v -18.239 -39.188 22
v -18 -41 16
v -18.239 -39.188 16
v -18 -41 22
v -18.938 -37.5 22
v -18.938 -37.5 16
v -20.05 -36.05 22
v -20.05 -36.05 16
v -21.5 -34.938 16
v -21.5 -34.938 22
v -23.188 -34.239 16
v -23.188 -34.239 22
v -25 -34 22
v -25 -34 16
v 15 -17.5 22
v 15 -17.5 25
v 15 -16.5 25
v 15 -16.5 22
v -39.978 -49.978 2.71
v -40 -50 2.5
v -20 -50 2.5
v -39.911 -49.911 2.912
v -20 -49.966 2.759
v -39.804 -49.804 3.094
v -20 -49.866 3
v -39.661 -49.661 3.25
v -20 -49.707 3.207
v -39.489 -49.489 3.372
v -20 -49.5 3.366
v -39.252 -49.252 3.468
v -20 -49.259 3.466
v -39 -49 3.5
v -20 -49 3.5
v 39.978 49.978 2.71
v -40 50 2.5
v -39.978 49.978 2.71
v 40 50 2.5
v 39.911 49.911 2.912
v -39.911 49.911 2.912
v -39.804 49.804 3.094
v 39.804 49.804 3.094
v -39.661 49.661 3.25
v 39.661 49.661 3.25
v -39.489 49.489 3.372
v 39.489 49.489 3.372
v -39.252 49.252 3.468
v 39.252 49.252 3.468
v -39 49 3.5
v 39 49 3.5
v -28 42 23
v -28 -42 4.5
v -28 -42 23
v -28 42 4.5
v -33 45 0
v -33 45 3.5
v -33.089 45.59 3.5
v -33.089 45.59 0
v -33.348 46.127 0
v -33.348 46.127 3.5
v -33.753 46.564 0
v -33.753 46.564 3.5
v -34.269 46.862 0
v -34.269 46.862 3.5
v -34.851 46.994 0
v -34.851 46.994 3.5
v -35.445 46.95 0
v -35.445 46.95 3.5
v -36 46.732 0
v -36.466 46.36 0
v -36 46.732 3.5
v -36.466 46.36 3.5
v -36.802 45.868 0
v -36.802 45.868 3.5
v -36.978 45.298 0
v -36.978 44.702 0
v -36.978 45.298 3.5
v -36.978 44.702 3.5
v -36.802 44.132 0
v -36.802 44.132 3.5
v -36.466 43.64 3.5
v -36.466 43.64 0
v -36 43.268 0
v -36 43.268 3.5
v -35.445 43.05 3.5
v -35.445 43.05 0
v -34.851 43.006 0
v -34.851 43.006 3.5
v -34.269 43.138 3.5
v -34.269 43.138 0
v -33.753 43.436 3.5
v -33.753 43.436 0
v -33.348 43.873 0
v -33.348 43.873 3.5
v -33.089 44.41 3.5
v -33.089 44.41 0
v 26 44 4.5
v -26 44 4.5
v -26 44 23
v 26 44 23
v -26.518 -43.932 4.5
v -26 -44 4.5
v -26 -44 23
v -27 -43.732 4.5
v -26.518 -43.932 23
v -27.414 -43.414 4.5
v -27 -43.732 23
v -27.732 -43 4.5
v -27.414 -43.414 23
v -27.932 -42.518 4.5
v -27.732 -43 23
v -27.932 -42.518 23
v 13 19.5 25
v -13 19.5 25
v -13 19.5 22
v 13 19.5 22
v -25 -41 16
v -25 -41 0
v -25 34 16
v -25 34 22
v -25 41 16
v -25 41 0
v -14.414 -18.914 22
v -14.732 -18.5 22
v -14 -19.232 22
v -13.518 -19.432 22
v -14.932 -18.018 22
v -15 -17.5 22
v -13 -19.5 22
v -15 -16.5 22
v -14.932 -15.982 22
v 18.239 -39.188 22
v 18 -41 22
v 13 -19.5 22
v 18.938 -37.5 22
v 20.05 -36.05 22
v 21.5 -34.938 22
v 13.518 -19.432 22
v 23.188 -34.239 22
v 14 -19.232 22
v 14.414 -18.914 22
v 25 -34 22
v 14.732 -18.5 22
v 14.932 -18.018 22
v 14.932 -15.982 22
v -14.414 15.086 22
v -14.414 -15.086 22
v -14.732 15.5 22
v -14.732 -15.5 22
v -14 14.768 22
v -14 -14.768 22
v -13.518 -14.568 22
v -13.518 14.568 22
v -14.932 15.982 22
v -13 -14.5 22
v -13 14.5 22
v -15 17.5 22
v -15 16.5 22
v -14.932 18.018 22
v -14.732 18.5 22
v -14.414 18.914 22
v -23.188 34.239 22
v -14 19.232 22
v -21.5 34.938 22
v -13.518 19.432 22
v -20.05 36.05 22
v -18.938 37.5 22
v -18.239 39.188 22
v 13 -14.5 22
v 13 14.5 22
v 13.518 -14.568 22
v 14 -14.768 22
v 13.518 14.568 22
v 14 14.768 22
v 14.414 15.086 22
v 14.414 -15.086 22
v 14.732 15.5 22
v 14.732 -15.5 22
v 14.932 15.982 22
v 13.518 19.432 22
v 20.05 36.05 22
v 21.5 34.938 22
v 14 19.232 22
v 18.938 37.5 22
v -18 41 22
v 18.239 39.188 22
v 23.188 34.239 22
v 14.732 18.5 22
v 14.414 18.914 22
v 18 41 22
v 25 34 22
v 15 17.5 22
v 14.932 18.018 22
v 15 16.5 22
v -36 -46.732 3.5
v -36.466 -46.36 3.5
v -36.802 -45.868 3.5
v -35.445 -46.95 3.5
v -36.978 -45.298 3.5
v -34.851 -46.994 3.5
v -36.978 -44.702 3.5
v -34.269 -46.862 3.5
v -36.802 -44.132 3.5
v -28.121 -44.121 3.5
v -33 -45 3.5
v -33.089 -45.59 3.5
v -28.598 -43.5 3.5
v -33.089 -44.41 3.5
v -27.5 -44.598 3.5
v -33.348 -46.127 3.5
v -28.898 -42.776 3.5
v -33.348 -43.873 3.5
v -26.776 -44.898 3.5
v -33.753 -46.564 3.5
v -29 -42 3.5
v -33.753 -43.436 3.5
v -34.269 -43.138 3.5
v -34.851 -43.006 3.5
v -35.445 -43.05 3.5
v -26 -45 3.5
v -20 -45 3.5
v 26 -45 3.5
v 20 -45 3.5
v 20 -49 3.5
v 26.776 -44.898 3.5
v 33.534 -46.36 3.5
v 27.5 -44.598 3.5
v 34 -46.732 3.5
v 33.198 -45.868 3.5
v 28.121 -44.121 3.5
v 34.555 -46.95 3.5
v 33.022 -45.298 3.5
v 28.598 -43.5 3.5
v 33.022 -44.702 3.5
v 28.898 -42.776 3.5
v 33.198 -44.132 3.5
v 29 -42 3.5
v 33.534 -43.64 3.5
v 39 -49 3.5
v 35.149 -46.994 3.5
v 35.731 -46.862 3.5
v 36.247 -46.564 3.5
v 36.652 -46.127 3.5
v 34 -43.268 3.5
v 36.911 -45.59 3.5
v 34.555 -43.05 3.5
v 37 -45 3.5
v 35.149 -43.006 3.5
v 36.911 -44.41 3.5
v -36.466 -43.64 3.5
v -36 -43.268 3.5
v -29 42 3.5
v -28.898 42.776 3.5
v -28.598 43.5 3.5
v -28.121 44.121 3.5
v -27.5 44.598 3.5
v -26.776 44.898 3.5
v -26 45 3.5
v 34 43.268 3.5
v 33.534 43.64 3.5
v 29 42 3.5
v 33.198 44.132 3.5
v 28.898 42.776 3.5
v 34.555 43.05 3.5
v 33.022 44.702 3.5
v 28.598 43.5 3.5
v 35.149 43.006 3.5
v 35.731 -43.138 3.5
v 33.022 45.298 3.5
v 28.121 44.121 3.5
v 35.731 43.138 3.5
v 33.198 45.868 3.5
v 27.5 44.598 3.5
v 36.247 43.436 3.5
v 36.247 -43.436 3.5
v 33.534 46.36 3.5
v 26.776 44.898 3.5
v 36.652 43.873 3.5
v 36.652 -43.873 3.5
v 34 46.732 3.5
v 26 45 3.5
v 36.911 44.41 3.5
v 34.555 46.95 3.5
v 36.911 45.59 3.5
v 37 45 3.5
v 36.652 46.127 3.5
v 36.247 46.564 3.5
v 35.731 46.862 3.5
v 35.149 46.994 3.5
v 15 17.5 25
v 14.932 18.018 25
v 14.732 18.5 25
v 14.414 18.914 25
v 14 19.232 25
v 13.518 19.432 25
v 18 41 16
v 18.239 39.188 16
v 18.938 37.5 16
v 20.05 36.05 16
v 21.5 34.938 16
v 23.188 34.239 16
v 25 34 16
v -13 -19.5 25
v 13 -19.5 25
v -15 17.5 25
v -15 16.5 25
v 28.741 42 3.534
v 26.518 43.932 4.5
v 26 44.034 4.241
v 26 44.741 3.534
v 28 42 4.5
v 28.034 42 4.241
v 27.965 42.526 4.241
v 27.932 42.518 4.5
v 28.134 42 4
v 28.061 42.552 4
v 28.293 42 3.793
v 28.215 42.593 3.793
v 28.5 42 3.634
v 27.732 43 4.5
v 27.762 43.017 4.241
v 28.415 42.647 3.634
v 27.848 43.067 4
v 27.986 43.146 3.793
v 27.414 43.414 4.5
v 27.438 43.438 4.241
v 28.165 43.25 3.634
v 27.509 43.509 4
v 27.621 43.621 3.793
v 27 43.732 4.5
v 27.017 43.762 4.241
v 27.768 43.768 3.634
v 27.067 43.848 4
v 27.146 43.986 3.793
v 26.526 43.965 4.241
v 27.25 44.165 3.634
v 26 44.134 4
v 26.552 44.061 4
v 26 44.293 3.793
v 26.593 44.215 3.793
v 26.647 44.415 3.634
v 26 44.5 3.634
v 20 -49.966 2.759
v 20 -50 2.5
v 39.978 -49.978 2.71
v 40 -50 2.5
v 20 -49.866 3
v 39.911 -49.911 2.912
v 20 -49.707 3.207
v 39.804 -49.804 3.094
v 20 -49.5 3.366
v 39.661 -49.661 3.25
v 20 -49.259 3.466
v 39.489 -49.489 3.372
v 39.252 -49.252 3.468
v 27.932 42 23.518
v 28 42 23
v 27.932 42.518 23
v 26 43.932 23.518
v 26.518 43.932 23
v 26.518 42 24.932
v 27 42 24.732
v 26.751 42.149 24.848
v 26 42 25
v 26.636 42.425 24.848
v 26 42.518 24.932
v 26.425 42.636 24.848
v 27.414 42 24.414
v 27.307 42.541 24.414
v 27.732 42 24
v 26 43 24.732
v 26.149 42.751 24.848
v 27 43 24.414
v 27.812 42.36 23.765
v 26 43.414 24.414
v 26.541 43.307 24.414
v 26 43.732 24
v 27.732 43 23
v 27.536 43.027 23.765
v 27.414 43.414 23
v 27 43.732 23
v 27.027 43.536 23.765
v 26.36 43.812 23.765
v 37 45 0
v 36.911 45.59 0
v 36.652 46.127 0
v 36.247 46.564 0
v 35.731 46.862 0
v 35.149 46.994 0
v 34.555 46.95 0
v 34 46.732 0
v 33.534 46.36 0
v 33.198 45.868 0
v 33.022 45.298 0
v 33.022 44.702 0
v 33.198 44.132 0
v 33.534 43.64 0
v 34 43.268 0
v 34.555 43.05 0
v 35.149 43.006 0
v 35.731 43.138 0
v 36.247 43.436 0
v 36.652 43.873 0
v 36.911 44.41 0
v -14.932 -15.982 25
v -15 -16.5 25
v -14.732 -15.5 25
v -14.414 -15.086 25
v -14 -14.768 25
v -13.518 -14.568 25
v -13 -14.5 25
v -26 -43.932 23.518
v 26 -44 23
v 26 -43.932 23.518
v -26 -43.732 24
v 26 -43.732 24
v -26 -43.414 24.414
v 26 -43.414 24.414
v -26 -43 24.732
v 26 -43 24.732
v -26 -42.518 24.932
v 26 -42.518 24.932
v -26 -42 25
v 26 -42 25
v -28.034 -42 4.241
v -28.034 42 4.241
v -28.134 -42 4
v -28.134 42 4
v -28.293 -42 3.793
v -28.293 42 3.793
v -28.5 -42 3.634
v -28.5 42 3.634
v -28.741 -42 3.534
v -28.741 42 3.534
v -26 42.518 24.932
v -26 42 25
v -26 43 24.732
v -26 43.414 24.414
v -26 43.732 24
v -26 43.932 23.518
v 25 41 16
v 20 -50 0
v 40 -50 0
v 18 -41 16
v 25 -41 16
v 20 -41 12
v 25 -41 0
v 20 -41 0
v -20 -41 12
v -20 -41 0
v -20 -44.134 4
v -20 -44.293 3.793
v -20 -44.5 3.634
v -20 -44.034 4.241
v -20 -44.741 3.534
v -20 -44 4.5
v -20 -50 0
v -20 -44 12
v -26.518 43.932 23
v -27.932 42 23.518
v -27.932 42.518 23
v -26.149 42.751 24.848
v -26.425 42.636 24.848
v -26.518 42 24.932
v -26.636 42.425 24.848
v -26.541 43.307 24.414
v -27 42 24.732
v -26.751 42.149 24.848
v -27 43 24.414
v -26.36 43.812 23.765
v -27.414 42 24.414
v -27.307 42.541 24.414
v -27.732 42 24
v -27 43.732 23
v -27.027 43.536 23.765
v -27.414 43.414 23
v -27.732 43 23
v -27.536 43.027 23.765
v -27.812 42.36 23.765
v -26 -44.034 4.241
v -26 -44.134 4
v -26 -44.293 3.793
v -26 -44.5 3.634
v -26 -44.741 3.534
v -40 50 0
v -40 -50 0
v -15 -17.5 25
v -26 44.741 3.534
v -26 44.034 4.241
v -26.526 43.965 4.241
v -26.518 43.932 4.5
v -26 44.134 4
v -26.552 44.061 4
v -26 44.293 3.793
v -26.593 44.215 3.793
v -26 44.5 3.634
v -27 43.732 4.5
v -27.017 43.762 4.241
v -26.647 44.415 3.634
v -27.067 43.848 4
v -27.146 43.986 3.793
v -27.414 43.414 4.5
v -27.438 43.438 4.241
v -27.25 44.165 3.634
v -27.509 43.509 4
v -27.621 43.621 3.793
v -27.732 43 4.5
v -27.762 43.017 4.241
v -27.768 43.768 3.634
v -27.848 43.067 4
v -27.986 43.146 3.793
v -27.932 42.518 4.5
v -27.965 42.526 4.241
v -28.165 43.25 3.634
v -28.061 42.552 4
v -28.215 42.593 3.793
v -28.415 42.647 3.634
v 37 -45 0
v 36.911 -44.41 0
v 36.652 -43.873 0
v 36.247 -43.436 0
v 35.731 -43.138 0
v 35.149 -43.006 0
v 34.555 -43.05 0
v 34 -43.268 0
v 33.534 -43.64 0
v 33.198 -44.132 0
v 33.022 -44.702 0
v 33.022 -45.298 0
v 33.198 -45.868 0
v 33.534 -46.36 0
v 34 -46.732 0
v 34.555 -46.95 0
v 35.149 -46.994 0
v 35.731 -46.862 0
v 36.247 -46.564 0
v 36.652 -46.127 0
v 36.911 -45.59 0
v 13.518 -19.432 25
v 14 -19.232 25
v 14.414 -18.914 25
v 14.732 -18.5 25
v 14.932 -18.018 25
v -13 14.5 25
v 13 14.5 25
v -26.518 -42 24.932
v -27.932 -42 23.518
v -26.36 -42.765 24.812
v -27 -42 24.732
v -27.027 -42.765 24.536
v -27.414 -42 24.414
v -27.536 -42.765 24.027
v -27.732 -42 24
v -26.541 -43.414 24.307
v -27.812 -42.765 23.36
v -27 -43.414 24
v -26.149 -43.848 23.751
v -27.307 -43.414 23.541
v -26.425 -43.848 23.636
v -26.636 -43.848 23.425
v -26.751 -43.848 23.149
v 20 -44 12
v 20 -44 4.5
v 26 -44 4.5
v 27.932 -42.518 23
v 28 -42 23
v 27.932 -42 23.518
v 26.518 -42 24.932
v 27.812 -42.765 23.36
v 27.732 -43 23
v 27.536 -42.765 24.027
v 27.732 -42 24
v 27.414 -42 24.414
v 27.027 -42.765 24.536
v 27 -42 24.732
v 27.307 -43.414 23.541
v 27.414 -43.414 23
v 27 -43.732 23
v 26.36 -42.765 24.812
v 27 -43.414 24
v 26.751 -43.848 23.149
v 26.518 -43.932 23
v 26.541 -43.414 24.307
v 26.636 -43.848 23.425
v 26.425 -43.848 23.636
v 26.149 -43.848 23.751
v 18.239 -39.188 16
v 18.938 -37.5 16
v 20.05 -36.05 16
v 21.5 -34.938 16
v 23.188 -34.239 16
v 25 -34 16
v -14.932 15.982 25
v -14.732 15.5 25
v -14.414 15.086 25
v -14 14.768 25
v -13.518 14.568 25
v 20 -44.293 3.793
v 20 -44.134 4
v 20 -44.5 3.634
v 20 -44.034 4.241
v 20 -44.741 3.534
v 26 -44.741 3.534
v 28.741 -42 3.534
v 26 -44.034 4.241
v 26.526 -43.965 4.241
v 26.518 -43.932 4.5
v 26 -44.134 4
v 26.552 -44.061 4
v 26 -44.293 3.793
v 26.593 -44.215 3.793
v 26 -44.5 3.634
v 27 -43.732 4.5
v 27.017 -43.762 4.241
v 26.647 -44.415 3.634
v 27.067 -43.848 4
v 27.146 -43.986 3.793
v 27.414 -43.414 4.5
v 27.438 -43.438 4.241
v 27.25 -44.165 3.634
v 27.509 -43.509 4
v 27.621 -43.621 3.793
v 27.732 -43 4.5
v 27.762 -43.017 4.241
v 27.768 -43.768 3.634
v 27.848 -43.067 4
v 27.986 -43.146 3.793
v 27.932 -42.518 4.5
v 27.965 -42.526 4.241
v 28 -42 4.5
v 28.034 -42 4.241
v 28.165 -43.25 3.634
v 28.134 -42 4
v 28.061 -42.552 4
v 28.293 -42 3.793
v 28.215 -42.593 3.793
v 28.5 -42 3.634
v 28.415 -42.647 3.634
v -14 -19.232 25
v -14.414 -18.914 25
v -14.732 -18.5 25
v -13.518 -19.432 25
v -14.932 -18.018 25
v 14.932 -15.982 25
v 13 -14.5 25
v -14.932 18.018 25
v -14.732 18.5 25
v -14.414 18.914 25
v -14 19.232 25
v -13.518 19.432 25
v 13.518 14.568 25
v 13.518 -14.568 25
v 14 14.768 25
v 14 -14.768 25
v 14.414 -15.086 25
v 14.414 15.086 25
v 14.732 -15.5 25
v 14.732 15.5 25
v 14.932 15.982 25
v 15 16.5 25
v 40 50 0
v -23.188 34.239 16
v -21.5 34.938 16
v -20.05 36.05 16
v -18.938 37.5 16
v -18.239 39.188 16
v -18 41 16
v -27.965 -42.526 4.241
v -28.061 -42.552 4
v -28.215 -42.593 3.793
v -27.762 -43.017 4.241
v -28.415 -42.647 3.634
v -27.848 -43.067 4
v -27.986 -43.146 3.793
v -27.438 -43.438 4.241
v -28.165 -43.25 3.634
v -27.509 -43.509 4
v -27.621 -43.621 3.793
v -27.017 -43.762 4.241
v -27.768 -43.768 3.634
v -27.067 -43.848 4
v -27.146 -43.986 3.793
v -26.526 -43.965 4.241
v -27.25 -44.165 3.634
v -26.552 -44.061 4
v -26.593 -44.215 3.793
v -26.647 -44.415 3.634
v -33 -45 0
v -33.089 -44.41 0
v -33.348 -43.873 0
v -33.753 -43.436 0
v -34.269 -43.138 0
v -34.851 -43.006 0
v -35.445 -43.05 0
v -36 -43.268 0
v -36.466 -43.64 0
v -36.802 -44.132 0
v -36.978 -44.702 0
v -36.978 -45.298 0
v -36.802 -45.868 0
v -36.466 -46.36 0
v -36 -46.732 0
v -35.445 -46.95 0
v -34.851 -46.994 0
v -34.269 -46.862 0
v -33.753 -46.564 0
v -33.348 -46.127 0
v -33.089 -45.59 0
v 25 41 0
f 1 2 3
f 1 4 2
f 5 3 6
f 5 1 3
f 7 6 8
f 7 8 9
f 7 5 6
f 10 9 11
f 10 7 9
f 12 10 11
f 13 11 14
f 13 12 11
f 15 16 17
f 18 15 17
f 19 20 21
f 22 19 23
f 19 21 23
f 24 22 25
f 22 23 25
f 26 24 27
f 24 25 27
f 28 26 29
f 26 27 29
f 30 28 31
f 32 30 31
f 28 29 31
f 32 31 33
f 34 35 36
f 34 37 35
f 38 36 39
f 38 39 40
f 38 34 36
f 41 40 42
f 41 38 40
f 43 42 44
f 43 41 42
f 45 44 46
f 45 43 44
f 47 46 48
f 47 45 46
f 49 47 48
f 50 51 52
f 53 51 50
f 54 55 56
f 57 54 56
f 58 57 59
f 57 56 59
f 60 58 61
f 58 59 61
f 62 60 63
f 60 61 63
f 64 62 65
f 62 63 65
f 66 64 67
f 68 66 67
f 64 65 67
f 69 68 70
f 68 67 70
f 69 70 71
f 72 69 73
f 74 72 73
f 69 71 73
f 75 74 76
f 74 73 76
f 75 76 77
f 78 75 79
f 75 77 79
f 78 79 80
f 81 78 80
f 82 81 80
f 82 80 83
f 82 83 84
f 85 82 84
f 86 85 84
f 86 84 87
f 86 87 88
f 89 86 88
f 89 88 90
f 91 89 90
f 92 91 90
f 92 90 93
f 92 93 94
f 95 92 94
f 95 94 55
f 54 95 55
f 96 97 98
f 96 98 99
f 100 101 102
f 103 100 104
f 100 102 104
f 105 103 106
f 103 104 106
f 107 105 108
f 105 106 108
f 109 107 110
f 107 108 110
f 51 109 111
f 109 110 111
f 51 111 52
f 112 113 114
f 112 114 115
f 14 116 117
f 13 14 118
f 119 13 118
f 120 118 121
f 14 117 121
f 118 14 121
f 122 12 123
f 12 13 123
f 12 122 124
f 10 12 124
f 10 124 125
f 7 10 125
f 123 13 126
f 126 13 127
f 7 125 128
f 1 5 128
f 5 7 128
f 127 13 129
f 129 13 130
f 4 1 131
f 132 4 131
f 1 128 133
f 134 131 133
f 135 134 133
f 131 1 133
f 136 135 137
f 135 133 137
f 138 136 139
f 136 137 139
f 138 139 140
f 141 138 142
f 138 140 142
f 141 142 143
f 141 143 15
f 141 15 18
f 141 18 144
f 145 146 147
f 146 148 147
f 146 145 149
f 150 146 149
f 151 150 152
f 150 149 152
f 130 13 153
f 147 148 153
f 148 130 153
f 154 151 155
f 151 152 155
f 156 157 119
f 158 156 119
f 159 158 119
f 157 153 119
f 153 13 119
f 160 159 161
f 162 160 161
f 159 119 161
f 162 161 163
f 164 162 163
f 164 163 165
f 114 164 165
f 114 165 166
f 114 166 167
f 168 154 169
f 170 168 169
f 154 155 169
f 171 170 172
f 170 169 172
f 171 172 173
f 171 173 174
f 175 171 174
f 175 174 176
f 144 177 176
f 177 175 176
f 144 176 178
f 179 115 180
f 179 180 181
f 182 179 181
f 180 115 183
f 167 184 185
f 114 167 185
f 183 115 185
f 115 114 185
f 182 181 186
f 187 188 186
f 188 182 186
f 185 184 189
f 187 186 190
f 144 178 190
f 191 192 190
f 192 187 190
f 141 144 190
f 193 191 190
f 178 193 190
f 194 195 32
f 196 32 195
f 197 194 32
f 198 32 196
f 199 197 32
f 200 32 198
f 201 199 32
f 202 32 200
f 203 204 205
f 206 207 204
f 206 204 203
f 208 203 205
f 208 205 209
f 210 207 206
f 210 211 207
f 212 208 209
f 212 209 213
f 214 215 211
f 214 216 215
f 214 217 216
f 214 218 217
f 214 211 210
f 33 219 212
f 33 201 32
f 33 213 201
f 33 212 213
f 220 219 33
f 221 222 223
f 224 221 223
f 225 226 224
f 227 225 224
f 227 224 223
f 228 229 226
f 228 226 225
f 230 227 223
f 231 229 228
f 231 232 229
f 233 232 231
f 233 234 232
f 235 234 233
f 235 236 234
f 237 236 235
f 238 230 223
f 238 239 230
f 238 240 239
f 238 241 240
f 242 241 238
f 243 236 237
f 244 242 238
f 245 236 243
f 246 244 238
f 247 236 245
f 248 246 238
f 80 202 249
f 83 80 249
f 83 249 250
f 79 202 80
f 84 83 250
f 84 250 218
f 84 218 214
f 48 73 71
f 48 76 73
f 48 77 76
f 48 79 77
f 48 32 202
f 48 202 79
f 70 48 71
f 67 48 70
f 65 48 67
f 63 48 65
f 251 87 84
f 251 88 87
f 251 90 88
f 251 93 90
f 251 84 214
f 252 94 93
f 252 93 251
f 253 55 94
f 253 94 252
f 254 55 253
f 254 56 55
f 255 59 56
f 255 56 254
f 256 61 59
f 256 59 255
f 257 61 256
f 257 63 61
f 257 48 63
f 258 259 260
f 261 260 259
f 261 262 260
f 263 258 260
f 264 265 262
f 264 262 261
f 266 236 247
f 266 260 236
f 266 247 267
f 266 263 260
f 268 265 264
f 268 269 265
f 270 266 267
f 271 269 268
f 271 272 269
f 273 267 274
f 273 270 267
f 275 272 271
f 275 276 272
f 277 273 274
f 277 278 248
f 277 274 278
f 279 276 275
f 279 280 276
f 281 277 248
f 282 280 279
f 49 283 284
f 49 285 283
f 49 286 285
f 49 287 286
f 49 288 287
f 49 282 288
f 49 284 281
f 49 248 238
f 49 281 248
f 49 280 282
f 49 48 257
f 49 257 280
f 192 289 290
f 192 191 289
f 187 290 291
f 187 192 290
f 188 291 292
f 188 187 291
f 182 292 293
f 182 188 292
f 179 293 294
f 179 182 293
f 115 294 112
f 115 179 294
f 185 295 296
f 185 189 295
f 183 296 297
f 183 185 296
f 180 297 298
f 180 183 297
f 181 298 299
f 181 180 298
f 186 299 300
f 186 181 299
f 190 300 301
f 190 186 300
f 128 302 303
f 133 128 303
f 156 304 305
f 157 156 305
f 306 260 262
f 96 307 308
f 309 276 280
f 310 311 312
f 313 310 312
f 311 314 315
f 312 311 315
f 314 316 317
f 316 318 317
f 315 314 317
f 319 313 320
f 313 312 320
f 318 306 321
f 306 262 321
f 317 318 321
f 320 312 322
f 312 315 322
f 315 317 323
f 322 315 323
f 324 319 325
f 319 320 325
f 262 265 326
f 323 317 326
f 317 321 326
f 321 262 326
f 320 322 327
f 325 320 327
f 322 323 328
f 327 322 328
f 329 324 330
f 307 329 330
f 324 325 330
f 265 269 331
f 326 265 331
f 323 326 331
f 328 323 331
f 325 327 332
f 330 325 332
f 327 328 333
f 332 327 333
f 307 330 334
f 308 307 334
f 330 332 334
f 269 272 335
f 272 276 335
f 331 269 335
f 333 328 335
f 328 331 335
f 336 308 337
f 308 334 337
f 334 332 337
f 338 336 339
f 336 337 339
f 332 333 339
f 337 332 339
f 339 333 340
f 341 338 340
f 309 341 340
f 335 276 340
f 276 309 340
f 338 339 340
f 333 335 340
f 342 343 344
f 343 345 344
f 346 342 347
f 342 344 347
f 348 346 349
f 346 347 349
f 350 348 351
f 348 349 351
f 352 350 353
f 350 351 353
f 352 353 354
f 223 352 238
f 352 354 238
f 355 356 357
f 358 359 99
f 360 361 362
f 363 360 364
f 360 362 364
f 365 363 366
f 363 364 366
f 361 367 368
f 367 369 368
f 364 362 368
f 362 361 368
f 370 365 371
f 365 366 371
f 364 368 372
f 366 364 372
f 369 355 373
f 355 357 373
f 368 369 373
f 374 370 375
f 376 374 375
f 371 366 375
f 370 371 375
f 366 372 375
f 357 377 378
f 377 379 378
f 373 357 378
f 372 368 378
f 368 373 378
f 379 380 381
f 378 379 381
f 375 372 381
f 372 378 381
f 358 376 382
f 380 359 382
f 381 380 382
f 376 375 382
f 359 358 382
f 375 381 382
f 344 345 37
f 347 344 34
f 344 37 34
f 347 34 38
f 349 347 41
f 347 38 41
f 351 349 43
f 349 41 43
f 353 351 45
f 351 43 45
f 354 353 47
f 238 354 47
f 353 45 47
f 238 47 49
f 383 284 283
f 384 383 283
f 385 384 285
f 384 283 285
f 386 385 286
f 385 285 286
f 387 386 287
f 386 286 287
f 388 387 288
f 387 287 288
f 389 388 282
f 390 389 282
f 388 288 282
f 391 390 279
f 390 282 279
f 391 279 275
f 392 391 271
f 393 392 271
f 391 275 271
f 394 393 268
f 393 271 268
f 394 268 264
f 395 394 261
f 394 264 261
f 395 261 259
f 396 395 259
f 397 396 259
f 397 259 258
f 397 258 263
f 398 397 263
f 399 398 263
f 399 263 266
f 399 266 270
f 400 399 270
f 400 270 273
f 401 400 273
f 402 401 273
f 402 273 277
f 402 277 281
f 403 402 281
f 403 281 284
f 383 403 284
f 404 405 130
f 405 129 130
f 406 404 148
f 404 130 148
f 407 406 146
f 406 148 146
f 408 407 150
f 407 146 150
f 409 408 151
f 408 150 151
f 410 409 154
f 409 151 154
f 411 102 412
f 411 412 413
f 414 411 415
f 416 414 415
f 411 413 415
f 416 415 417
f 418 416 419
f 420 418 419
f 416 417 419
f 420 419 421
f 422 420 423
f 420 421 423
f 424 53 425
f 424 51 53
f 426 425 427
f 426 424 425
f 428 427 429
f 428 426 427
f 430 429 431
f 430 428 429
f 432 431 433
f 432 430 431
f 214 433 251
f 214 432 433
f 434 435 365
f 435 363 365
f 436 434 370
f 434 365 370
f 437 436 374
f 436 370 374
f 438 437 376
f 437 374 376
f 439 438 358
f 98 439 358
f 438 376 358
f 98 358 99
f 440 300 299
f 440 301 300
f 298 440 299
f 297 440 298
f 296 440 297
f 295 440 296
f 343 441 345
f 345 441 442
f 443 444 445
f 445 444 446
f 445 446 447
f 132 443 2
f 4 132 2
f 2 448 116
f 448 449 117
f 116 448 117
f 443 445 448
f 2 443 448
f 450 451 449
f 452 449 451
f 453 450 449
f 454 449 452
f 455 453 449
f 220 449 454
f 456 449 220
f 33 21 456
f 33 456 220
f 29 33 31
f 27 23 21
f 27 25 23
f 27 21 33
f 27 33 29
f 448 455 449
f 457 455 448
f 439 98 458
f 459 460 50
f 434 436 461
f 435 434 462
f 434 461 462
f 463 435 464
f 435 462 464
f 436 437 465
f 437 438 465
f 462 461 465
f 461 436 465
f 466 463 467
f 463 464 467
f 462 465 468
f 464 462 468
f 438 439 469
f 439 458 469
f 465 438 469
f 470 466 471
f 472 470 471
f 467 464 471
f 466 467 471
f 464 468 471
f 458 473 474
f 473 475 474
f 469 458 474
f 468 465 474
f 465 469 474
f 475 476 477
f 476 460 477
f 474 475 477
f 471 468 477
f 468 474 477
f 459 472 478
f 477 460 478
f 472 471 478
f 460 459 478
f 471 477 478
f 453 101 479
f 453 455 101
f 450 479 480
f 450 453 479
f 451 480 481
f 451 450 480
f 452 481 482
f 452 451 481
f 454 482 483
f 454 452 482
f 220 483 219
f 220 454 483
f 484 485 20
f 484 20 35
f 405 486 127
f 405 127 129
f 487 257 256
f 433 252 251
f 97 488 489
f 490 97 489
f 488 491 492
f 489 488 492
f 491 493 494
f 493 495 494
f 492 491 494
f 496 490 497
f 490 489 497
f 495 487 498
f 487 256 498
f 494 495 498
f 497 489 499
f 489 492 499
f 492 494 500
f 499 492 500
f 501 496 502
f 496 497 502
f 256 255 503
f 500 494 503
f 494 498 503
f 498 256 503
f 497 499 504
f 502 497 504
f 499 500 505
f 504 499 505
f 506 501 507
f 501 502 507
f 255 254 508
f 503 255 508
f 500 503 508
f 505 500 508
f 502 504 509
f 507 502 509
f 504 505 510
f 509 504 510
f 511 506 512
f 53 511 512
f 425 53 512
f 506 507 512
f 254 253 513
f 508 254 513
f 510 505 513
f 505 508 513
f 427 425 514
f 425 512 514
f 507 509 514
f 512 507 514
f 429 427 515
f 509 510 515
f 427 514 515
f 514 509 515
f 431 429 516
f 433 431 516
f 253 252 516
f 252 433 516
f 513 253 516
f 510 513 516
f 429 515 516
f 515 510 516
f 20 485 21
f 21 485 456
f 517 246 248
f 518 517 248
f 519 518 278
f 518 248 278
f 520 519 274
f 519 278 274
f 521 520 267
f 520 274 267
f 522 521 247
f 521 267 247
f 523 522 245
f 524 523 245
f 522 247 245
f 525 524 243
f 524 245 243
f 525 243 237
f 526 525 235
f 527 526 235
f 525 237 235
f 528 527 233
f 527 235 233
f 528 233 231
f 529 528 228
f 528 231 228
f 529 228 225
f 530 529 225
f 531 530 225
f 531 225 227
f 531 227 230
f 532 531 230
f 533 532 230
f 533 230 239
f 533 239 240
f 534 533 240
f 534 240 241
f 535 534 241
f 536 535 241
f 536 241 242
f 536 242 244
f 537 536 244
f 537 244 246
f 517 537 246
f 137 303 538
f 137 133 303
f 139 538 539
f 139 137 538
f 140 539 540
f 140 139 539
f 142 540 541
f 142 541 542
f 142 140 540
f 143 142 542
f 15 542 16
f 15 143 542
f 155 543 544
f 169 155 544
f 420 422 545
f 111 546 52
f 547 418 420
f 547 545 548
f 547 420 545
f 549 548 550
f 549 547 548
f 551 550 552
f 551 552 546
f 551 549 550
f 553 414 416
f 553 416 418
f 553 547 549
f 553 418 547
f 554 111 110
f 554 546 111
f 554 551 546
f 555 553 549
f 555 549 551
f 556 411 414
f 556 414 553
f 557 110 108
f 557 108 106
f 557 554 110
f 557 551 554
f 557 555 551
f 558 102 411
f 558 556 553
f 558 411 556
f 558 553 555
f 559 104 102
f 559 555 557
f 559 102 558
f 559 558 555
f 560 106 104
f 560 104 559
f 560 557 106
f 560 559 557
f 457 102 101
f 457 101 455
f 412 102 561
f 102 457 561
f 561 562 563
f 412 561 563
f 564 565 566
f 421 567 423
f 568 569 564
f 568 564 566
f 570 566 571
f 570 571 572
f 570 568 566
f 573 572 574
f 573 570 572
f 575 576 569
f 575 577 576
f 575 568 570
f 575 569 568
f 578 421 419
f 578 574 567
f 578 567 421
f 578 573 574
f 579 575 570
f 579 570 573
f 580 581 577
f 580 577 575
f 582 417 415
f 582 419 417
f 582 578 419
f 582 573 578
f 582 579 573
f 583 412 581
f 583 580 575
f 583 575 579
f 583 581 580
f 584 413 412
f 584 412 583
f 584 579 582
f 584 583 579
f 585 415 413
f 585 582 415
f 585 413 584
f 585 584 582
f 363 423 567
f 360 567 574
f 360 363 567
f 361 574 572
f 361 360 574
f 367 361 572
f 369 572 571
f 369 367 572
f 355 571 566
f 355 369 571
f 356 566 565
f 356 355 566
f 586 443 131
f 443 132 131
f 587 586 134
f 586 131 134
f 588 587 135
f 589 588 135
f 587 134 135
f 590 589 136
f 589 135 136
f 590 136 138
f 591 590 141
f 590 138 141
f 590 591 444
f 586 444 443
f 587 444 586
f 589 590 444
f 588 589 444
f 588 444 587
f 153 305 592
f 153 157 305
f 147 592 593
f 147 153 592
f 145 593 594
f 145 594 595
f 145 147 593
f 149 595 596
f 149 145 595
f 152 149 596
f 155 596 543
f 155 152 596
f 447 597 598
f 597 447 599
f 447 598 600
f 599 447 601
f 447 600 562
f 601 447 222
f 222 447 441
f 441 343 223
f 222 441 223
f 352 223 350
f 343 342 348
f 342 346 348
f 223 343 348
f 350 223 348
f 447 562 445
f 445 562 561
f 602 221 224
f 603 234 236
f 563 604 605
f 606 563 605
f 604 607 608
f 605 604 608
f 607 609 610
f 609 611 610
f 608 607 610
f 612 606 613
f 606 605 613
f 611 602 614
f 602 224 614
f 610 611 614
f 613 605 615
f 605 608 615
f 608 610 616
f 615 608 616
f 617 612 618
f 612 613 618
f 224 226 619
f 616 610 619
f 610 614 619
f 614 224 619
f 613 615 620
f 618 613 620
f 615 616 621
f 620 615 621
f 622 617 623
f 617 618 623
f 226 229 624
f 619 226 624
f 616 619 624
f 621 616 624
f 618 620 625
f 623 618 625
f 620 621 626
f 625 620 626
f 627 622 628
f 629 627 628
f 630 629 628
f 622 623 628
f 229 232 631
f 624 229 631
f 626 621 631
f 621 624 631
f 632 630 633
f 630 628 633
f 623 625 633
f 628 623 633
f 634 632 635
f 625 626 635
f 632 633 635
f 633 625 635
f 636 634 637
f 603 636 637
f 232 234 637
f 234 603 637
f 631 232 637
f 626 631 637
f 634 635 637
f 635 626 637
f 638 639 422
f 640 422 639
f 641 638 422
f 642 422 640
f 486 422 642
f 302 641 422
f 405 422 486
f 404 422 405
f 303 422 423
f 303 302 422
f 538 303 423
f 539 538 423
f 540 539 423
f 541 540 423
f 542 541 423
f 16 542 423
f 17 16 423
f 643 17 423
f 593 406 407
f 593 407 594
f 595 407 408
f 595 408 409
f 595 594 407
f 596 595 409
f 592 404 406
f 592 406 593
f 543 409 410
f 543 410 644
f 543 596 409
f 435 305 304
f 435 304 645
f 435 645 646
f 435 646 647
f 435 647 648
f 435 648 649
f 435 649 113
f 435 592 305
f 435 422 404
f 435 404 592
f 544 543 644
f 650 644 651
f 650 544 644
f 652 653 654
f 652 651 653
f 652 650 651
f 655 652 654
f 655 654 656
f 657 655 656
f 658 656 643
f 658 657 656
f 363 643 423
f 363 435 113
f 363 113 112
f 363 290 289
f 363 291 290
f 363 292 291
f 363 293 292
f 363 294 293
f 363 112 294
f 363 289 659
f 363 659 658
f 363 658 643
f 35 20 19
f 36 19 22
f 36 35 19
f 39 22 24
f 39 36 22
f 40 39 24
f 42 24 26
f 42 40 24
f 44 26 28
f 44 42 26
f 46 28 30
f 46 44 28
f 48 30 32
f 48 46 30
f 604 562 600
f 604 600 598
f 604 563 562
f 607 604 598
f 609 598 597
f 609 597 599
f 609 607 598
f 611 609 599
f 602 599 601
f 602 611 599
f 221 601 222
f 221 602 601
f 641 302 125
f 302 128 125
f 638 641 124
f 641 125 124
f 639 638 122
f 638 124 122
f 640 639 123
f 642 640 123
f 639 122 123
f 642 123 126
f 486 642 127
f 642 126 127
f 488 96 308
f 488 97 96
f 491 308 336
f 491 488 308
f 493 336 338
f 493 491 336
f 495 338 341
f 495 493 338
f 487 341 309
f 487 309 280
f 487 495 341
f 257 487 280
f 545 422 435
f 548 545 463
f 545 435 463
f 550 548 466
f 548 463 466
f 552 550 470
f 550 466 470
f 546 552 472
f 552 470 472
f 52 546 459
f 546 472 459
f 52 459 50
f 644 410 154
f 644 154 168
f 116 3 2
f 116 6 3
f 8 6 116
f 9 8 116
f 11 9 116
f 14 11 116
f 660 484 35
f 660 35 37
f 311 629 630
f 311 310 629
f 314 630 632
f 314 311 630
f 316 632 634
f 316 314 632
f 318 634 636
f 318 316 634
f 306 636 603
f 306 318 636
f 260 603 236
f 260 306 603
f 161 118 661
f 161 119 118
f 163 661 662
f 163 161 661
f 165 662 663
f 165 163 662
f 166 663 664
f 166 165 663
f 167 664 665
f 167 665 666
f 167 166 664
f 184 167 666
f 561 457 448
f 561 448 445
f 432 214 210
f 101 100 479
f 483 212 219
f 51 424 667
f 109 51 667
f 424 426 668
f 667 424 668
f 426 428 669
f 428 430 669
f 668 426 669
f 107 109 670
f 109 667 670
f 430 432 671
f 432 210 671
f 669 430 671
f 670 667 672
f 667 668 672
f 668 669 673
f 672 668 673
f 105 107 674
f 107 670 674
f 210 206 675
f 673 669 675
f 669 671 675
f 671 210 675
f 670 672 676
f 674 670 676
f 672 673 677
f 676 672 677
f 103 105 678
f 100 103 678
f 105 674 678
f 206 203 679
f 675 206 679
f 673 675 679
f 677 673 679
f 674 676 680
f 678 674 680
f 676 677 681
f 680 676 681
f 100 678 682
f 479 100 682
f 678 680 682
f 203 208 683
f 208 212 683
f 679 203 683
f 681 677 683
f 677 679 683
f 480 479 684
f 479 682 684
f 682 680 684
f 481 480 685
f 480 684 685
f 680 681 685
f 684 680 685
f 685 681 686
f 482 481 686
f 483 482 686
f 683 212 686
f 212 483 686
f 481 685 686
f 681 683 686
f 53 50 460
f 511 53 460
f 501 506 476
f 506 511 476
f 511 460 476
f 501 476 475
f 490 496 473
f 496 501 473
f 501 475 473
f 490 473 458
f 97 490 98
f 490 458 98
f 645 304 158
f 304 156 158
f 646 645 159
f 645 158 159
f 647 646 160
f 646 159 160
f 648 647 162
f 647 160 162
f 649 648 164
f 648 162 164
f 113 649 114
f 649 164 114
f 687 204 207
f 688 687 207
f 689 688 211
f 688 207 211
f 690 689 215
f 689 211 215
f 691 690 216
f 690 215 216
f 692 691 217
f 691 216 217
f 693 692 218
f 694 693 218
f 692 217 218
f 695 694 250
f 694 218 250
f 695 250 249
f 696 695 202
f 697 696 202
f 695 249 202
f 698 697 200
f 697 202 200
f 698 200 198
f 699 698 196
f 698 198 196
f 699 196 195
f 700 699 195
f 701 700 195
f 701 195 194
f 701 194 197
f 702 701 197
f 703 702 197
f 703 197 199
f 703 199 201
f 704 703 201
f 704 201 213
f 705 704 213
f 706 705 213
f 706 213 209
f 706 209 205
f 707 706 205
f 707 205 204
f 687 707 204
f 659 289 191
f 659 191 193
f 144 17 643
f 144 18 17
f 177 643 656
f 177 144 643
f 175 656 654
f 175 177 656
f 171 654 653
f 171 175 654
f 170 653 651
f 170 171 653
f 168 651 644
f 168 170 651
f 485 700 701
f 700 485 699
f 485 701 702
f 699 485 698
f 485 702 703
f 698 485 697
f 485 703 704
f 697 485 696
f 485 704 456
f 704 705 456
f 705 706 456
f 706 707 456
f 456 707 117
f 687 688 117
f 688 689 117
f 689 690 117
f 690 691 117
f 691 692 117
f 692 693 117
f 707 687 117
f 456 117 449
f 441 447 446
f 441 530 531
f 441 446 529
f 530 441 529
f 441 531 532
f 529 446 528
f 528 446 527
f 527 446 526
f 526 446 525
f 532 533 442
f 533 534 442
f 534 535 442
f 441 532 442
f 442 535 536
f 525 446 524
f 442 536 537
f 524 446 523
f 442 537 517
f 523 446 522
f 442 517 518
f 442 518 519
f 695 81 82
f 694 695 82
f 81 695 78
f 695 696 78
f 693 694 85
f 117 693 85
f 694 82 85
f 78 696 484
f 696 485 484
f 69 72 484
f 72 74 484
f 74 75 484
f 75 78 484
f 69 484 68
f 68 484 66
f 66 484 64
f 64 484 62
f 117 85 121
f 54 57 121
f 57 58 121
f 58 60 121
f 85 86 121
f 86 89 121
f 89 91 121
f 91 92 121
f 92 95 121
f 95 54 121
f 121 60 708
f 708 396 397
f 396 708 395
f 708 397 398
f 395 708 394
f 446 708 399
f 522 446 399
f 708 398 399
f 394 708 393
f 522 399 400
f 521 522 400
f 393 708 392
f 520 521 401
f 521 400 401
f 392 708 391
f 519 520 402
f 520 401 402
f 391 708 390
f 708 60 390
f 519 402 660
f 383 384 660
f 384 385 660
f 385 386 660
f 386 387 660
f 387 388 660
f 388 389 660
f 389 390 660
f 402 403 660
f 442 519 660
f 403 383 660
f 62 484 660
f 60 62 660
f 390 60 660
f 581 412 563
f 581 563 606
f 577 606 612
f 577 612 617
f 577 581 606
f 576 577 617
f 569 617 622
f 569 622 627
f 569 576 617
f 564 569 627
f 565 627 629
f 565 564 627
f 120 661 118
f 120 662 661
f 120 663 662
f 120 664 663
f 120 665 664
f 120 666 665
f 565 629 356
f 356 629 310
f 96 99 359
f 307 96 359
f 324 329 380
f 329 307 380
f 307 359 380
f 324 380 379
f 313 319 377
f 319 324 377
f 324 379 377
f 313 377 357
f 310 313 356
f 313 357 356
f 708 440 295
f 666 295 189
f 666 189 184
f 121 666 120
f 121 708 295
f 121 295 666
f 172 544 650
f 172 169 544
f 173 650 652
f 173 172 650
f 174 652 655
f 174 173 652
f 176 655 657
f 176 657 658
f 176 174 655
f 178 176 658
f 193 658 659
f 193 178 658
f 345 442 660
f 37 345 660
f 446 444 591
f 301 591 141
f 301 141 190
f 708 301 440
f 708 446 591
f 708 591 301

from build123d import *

# Parameters (mm, degrees)
SKETCH1_W             = 80
SKETCH1_H             = 100
BOSS_EXTRUDE1_DEPTH   = 3.5
SKETCH3_W             = 56
SKETCH3_H             = 88
BOSS_EXTRUDE2_DEPTH   = 21.5
SKETCH4_W             = 50
SKETCH4_H             = 82
CUT_EXTRUDE4_DEPTH    = 16
CUT_EXTRUDE5_DEPTH    = 6
SKETCH8_W             = 30
SKETCH8_H             = 5
CUT_EXTRUDE6_DEPTH    = 6
CUT_EXTRUDE7_REACH    = 112.567
SKETCH9_W             = 40
SKETCH9_H             = 12
F_4_0MM_DOWEL_HOLE1_D = 4
FILLET1_R             = 7
FILLET2_R             = 2
FILLET3_R             = 1
FILLET4_R             = 2


# Some blends are built 0.0001 mm under size
with BuildPart() as part:
    # Sketch1 → Boss-Extrude1 (new body)
    with BuildSketch(Plane.XY):
        Rectangle(SKETCH1_W, SKETCH1_H)
    extrude(amount=BOSS_EXTRUDE1_DEPTH)

    # Sketch3 → Boss-Extrude2 (add)
    with BuildSketch(Plane.XY.offset(3.5)):
        Rectangle(SKETCH3_W, SKETCH3_H)
    extrude(amount=BOSS_EXTRUDE2_DEPTH)

    # Sketch4 → Cut-Extrude4 (cut)
    with BuildSketch(Plane(origin=(0, 0, 0), x_dir=(-1, 0, 0), z_dir=(0, 0, -1))):
        Rectangle(SKETCH4_W, SKETCH4_H)
    extrude(amount=-CUT_EXTRUDE4_DEPTH, mode=Mode.SUBTRACT)

    # Sketch7 → Cut-Extrude5 (cut)
    with BuildSketch(Plane(origin=(0, 0, 16), x_dir=(-1, 0, 0), z_dir=(0, 0, -1))):
        Polygon((-18, 41), (18, 41), (18, 34), (25, 34), (25, -34), (18, -34), (18, -41), (-18, -41), (-18, -34), (-25, -34), (-25, 34), (-18, 34), align=None)
    extrude(amount=-CUT_EXTRUDE5_DEPTH, mode=Mode.SUBTRACT)

    # Sketch8 → Cut-Extrude6 (cut)
    with BuildSketch(Plane.XY.offset(25)):
        with Locations((0, -17)):
            Rectangle(SKETCH8_W, SKETCH8_H)
    cut_extrude6 = extrude(amount=-CUT_EXTRUDE6_DEPTH, mode=Mode.SUBTRACT)

    # Mirror1: Cut-Extrude6 across plane
    add(cut_extrude6.mirror(Plane.ZX), mode=Mode.SUBTRACT)

    # Sketch9 → Cut-Extrude7 (cut, up to next)
    with BuildSketch(Plane.XZ.offset(50), mode=Mode.PRIVATE) as cut_extrude7_sk1:
        with Locations((0, 6)):
            Rectangle(SKETCH9_W, SKETCH9_H)
    cut_extrude7_tool1 = extrude(cut_extrude7_sk1.sketch, amount=-CUT_EXTRUDE7_REACH, mode=Mode.PRIVATE) & part.part
    add(cut_extrude7_tool1.solids().sort_by_distance((0, -50, 6))[0], mode=Mode.SUBTRACT)

    # Ø4.0mm Dowel Hole1 (through all)
    with Locations(Plane(origin=(0, 0, 0), x_dir=(-1, 0, 0), z_dir=(0, 0, -1))):
        with Locations((-35, 45), (35, 45), (35, -45), (-35, -45)):
            Hole(F_4_0MM_DOWEL_HOLE1_D / 2)

    # Fillet1
    fillet1_edges = [part.edges().sort_by_distance(p)[0] for p in [
        (-18, 34, 19),
        (18, 34, 19),
        (18, -34, 19),
        (-18, -34, 19),
    ]]
    fillet(fillet1_edges, radius=FILLET1_R - 0.0001)  # a hair under: the kernel refuses the full size

    # Fillet2
    fillet2_edges = [part.edges().sort_by_distance(p)[0] for p in [
        (28, -44, 14.25),
        (28, 44, 14.25),
        (-28, 44, 14.25),
        (-28, -44, 14.25),
        (28, 0, 25),
        (0, 44, 25),
        (-28, 0, 25),
        (15, -14.5, 23.5),
        (15, -19.5, 23.5),
        (-15, -19.5, 23.5),
        (-15, -14.5, 23.5),
        (15, 19.5, 23.5),
        (15, 14.5, 23.5),
        (-15, 14.5, 23.5),
        (-15, 19.5, 23.5),
    ]]
    fillet(fillet2_edges, radius=FILLET2_R)

    # Fillet3
    fillet3_edges = [part.edges().sort_by_distance(p)[0] for p in [
        (-40, 0, 3.5),
        (23, -44, 3.5),
        (30, -50, 3.5),
        (-30, -50, 3.5),
        (28, 0, 3.5),
        (-23, -44, 3.5),
        (-28, 0, 3.5),
        (0, 44, 3.5),
        (27.414213562, -43.414213562, 3.5),
        (-27.414213562, -43.414213562, 3.5),
        (-27.414213562, 43.414213562, 3.5),
        (27.414213562, 43.414213562, 3.5),
        (40, 0, 3.5),
        (0, 50, 3.5),
    ]]
    fillet(fillet3_edges, radius=FILLET3_R)

    # Fillet4
    # the kernel refuses this fillet: 2 mm, written as the material it takes off along each edge
    with BuildSketch(Plane(origin=(-26, -42, 23), x_dir=(0, 0, 1), z_dir=(0, -1, 0))) as fillet4_piece_1_section:
        Polygon((0, 0), (FILLET4_R, 0), (FILLET4_R, FILLET4_R), (0, FILLET4_R), align=None)
    fillet4_piece_1 = extrude(amount=FILLET4_R, mode=Mode.PRIVATE)
    fillet4_piece_1 = fillet4_piece_1 - Plane(origin=(-26, -42, 23), x_dir=(0.7071067811865475, 0, -0.7071067811865475), z_dir=(0, -1, 0)) * Sphere(FILLET4_R, mode=Mode.PRIVATE)
    add(fillet4_piece_1, mode=Mode.SUBTRACT)
    with BuildSketch(Plane(origin=(26, -42, 23), x_dir=(0, 0, 1), z_dir=(0, -1, 0))) as fillet4_piece_2_section:
        Polygon((0, 0), (FILLET4_R, 0), (FILLET4_R, -FILLET4_R), (0, -FILLET4_R), align=None)
    fillet4_piece_2 = extrude(amount=FILLET4_R, mode=Mode.PRIVATE)
    fillet4_piece_2 = fillet4_piece_2 - Plane(origin=(26, -42, 23), x_dir=(-0.7071067811865475, 0, -0.7071067811865475), z_dir=(0, -1, 0)) * Sphere(FILLET4_R, mode=Mode.PRIVATE)
    add(fillet4_piece_2, mode=Mode.SUBTRACT)
    with BuildSketch(Plane(origin=(26, -44, 25), x_dir=(0, 0, -1), z_dir=(-1, 0, 0))) as fillet4_piece_3:
        with BuildLine():
            CenterArc((FILLET4_R, -FILLET4_R), FILLET4_R, 90, 90)
            Line((0, -FILLET4_R), (0, 0))
            Line((0, 0), (FILLET4_R, 0))
        make_face()
    extrude(amount=52, mode=Mode.SUBTRACT)


solid = part.part
